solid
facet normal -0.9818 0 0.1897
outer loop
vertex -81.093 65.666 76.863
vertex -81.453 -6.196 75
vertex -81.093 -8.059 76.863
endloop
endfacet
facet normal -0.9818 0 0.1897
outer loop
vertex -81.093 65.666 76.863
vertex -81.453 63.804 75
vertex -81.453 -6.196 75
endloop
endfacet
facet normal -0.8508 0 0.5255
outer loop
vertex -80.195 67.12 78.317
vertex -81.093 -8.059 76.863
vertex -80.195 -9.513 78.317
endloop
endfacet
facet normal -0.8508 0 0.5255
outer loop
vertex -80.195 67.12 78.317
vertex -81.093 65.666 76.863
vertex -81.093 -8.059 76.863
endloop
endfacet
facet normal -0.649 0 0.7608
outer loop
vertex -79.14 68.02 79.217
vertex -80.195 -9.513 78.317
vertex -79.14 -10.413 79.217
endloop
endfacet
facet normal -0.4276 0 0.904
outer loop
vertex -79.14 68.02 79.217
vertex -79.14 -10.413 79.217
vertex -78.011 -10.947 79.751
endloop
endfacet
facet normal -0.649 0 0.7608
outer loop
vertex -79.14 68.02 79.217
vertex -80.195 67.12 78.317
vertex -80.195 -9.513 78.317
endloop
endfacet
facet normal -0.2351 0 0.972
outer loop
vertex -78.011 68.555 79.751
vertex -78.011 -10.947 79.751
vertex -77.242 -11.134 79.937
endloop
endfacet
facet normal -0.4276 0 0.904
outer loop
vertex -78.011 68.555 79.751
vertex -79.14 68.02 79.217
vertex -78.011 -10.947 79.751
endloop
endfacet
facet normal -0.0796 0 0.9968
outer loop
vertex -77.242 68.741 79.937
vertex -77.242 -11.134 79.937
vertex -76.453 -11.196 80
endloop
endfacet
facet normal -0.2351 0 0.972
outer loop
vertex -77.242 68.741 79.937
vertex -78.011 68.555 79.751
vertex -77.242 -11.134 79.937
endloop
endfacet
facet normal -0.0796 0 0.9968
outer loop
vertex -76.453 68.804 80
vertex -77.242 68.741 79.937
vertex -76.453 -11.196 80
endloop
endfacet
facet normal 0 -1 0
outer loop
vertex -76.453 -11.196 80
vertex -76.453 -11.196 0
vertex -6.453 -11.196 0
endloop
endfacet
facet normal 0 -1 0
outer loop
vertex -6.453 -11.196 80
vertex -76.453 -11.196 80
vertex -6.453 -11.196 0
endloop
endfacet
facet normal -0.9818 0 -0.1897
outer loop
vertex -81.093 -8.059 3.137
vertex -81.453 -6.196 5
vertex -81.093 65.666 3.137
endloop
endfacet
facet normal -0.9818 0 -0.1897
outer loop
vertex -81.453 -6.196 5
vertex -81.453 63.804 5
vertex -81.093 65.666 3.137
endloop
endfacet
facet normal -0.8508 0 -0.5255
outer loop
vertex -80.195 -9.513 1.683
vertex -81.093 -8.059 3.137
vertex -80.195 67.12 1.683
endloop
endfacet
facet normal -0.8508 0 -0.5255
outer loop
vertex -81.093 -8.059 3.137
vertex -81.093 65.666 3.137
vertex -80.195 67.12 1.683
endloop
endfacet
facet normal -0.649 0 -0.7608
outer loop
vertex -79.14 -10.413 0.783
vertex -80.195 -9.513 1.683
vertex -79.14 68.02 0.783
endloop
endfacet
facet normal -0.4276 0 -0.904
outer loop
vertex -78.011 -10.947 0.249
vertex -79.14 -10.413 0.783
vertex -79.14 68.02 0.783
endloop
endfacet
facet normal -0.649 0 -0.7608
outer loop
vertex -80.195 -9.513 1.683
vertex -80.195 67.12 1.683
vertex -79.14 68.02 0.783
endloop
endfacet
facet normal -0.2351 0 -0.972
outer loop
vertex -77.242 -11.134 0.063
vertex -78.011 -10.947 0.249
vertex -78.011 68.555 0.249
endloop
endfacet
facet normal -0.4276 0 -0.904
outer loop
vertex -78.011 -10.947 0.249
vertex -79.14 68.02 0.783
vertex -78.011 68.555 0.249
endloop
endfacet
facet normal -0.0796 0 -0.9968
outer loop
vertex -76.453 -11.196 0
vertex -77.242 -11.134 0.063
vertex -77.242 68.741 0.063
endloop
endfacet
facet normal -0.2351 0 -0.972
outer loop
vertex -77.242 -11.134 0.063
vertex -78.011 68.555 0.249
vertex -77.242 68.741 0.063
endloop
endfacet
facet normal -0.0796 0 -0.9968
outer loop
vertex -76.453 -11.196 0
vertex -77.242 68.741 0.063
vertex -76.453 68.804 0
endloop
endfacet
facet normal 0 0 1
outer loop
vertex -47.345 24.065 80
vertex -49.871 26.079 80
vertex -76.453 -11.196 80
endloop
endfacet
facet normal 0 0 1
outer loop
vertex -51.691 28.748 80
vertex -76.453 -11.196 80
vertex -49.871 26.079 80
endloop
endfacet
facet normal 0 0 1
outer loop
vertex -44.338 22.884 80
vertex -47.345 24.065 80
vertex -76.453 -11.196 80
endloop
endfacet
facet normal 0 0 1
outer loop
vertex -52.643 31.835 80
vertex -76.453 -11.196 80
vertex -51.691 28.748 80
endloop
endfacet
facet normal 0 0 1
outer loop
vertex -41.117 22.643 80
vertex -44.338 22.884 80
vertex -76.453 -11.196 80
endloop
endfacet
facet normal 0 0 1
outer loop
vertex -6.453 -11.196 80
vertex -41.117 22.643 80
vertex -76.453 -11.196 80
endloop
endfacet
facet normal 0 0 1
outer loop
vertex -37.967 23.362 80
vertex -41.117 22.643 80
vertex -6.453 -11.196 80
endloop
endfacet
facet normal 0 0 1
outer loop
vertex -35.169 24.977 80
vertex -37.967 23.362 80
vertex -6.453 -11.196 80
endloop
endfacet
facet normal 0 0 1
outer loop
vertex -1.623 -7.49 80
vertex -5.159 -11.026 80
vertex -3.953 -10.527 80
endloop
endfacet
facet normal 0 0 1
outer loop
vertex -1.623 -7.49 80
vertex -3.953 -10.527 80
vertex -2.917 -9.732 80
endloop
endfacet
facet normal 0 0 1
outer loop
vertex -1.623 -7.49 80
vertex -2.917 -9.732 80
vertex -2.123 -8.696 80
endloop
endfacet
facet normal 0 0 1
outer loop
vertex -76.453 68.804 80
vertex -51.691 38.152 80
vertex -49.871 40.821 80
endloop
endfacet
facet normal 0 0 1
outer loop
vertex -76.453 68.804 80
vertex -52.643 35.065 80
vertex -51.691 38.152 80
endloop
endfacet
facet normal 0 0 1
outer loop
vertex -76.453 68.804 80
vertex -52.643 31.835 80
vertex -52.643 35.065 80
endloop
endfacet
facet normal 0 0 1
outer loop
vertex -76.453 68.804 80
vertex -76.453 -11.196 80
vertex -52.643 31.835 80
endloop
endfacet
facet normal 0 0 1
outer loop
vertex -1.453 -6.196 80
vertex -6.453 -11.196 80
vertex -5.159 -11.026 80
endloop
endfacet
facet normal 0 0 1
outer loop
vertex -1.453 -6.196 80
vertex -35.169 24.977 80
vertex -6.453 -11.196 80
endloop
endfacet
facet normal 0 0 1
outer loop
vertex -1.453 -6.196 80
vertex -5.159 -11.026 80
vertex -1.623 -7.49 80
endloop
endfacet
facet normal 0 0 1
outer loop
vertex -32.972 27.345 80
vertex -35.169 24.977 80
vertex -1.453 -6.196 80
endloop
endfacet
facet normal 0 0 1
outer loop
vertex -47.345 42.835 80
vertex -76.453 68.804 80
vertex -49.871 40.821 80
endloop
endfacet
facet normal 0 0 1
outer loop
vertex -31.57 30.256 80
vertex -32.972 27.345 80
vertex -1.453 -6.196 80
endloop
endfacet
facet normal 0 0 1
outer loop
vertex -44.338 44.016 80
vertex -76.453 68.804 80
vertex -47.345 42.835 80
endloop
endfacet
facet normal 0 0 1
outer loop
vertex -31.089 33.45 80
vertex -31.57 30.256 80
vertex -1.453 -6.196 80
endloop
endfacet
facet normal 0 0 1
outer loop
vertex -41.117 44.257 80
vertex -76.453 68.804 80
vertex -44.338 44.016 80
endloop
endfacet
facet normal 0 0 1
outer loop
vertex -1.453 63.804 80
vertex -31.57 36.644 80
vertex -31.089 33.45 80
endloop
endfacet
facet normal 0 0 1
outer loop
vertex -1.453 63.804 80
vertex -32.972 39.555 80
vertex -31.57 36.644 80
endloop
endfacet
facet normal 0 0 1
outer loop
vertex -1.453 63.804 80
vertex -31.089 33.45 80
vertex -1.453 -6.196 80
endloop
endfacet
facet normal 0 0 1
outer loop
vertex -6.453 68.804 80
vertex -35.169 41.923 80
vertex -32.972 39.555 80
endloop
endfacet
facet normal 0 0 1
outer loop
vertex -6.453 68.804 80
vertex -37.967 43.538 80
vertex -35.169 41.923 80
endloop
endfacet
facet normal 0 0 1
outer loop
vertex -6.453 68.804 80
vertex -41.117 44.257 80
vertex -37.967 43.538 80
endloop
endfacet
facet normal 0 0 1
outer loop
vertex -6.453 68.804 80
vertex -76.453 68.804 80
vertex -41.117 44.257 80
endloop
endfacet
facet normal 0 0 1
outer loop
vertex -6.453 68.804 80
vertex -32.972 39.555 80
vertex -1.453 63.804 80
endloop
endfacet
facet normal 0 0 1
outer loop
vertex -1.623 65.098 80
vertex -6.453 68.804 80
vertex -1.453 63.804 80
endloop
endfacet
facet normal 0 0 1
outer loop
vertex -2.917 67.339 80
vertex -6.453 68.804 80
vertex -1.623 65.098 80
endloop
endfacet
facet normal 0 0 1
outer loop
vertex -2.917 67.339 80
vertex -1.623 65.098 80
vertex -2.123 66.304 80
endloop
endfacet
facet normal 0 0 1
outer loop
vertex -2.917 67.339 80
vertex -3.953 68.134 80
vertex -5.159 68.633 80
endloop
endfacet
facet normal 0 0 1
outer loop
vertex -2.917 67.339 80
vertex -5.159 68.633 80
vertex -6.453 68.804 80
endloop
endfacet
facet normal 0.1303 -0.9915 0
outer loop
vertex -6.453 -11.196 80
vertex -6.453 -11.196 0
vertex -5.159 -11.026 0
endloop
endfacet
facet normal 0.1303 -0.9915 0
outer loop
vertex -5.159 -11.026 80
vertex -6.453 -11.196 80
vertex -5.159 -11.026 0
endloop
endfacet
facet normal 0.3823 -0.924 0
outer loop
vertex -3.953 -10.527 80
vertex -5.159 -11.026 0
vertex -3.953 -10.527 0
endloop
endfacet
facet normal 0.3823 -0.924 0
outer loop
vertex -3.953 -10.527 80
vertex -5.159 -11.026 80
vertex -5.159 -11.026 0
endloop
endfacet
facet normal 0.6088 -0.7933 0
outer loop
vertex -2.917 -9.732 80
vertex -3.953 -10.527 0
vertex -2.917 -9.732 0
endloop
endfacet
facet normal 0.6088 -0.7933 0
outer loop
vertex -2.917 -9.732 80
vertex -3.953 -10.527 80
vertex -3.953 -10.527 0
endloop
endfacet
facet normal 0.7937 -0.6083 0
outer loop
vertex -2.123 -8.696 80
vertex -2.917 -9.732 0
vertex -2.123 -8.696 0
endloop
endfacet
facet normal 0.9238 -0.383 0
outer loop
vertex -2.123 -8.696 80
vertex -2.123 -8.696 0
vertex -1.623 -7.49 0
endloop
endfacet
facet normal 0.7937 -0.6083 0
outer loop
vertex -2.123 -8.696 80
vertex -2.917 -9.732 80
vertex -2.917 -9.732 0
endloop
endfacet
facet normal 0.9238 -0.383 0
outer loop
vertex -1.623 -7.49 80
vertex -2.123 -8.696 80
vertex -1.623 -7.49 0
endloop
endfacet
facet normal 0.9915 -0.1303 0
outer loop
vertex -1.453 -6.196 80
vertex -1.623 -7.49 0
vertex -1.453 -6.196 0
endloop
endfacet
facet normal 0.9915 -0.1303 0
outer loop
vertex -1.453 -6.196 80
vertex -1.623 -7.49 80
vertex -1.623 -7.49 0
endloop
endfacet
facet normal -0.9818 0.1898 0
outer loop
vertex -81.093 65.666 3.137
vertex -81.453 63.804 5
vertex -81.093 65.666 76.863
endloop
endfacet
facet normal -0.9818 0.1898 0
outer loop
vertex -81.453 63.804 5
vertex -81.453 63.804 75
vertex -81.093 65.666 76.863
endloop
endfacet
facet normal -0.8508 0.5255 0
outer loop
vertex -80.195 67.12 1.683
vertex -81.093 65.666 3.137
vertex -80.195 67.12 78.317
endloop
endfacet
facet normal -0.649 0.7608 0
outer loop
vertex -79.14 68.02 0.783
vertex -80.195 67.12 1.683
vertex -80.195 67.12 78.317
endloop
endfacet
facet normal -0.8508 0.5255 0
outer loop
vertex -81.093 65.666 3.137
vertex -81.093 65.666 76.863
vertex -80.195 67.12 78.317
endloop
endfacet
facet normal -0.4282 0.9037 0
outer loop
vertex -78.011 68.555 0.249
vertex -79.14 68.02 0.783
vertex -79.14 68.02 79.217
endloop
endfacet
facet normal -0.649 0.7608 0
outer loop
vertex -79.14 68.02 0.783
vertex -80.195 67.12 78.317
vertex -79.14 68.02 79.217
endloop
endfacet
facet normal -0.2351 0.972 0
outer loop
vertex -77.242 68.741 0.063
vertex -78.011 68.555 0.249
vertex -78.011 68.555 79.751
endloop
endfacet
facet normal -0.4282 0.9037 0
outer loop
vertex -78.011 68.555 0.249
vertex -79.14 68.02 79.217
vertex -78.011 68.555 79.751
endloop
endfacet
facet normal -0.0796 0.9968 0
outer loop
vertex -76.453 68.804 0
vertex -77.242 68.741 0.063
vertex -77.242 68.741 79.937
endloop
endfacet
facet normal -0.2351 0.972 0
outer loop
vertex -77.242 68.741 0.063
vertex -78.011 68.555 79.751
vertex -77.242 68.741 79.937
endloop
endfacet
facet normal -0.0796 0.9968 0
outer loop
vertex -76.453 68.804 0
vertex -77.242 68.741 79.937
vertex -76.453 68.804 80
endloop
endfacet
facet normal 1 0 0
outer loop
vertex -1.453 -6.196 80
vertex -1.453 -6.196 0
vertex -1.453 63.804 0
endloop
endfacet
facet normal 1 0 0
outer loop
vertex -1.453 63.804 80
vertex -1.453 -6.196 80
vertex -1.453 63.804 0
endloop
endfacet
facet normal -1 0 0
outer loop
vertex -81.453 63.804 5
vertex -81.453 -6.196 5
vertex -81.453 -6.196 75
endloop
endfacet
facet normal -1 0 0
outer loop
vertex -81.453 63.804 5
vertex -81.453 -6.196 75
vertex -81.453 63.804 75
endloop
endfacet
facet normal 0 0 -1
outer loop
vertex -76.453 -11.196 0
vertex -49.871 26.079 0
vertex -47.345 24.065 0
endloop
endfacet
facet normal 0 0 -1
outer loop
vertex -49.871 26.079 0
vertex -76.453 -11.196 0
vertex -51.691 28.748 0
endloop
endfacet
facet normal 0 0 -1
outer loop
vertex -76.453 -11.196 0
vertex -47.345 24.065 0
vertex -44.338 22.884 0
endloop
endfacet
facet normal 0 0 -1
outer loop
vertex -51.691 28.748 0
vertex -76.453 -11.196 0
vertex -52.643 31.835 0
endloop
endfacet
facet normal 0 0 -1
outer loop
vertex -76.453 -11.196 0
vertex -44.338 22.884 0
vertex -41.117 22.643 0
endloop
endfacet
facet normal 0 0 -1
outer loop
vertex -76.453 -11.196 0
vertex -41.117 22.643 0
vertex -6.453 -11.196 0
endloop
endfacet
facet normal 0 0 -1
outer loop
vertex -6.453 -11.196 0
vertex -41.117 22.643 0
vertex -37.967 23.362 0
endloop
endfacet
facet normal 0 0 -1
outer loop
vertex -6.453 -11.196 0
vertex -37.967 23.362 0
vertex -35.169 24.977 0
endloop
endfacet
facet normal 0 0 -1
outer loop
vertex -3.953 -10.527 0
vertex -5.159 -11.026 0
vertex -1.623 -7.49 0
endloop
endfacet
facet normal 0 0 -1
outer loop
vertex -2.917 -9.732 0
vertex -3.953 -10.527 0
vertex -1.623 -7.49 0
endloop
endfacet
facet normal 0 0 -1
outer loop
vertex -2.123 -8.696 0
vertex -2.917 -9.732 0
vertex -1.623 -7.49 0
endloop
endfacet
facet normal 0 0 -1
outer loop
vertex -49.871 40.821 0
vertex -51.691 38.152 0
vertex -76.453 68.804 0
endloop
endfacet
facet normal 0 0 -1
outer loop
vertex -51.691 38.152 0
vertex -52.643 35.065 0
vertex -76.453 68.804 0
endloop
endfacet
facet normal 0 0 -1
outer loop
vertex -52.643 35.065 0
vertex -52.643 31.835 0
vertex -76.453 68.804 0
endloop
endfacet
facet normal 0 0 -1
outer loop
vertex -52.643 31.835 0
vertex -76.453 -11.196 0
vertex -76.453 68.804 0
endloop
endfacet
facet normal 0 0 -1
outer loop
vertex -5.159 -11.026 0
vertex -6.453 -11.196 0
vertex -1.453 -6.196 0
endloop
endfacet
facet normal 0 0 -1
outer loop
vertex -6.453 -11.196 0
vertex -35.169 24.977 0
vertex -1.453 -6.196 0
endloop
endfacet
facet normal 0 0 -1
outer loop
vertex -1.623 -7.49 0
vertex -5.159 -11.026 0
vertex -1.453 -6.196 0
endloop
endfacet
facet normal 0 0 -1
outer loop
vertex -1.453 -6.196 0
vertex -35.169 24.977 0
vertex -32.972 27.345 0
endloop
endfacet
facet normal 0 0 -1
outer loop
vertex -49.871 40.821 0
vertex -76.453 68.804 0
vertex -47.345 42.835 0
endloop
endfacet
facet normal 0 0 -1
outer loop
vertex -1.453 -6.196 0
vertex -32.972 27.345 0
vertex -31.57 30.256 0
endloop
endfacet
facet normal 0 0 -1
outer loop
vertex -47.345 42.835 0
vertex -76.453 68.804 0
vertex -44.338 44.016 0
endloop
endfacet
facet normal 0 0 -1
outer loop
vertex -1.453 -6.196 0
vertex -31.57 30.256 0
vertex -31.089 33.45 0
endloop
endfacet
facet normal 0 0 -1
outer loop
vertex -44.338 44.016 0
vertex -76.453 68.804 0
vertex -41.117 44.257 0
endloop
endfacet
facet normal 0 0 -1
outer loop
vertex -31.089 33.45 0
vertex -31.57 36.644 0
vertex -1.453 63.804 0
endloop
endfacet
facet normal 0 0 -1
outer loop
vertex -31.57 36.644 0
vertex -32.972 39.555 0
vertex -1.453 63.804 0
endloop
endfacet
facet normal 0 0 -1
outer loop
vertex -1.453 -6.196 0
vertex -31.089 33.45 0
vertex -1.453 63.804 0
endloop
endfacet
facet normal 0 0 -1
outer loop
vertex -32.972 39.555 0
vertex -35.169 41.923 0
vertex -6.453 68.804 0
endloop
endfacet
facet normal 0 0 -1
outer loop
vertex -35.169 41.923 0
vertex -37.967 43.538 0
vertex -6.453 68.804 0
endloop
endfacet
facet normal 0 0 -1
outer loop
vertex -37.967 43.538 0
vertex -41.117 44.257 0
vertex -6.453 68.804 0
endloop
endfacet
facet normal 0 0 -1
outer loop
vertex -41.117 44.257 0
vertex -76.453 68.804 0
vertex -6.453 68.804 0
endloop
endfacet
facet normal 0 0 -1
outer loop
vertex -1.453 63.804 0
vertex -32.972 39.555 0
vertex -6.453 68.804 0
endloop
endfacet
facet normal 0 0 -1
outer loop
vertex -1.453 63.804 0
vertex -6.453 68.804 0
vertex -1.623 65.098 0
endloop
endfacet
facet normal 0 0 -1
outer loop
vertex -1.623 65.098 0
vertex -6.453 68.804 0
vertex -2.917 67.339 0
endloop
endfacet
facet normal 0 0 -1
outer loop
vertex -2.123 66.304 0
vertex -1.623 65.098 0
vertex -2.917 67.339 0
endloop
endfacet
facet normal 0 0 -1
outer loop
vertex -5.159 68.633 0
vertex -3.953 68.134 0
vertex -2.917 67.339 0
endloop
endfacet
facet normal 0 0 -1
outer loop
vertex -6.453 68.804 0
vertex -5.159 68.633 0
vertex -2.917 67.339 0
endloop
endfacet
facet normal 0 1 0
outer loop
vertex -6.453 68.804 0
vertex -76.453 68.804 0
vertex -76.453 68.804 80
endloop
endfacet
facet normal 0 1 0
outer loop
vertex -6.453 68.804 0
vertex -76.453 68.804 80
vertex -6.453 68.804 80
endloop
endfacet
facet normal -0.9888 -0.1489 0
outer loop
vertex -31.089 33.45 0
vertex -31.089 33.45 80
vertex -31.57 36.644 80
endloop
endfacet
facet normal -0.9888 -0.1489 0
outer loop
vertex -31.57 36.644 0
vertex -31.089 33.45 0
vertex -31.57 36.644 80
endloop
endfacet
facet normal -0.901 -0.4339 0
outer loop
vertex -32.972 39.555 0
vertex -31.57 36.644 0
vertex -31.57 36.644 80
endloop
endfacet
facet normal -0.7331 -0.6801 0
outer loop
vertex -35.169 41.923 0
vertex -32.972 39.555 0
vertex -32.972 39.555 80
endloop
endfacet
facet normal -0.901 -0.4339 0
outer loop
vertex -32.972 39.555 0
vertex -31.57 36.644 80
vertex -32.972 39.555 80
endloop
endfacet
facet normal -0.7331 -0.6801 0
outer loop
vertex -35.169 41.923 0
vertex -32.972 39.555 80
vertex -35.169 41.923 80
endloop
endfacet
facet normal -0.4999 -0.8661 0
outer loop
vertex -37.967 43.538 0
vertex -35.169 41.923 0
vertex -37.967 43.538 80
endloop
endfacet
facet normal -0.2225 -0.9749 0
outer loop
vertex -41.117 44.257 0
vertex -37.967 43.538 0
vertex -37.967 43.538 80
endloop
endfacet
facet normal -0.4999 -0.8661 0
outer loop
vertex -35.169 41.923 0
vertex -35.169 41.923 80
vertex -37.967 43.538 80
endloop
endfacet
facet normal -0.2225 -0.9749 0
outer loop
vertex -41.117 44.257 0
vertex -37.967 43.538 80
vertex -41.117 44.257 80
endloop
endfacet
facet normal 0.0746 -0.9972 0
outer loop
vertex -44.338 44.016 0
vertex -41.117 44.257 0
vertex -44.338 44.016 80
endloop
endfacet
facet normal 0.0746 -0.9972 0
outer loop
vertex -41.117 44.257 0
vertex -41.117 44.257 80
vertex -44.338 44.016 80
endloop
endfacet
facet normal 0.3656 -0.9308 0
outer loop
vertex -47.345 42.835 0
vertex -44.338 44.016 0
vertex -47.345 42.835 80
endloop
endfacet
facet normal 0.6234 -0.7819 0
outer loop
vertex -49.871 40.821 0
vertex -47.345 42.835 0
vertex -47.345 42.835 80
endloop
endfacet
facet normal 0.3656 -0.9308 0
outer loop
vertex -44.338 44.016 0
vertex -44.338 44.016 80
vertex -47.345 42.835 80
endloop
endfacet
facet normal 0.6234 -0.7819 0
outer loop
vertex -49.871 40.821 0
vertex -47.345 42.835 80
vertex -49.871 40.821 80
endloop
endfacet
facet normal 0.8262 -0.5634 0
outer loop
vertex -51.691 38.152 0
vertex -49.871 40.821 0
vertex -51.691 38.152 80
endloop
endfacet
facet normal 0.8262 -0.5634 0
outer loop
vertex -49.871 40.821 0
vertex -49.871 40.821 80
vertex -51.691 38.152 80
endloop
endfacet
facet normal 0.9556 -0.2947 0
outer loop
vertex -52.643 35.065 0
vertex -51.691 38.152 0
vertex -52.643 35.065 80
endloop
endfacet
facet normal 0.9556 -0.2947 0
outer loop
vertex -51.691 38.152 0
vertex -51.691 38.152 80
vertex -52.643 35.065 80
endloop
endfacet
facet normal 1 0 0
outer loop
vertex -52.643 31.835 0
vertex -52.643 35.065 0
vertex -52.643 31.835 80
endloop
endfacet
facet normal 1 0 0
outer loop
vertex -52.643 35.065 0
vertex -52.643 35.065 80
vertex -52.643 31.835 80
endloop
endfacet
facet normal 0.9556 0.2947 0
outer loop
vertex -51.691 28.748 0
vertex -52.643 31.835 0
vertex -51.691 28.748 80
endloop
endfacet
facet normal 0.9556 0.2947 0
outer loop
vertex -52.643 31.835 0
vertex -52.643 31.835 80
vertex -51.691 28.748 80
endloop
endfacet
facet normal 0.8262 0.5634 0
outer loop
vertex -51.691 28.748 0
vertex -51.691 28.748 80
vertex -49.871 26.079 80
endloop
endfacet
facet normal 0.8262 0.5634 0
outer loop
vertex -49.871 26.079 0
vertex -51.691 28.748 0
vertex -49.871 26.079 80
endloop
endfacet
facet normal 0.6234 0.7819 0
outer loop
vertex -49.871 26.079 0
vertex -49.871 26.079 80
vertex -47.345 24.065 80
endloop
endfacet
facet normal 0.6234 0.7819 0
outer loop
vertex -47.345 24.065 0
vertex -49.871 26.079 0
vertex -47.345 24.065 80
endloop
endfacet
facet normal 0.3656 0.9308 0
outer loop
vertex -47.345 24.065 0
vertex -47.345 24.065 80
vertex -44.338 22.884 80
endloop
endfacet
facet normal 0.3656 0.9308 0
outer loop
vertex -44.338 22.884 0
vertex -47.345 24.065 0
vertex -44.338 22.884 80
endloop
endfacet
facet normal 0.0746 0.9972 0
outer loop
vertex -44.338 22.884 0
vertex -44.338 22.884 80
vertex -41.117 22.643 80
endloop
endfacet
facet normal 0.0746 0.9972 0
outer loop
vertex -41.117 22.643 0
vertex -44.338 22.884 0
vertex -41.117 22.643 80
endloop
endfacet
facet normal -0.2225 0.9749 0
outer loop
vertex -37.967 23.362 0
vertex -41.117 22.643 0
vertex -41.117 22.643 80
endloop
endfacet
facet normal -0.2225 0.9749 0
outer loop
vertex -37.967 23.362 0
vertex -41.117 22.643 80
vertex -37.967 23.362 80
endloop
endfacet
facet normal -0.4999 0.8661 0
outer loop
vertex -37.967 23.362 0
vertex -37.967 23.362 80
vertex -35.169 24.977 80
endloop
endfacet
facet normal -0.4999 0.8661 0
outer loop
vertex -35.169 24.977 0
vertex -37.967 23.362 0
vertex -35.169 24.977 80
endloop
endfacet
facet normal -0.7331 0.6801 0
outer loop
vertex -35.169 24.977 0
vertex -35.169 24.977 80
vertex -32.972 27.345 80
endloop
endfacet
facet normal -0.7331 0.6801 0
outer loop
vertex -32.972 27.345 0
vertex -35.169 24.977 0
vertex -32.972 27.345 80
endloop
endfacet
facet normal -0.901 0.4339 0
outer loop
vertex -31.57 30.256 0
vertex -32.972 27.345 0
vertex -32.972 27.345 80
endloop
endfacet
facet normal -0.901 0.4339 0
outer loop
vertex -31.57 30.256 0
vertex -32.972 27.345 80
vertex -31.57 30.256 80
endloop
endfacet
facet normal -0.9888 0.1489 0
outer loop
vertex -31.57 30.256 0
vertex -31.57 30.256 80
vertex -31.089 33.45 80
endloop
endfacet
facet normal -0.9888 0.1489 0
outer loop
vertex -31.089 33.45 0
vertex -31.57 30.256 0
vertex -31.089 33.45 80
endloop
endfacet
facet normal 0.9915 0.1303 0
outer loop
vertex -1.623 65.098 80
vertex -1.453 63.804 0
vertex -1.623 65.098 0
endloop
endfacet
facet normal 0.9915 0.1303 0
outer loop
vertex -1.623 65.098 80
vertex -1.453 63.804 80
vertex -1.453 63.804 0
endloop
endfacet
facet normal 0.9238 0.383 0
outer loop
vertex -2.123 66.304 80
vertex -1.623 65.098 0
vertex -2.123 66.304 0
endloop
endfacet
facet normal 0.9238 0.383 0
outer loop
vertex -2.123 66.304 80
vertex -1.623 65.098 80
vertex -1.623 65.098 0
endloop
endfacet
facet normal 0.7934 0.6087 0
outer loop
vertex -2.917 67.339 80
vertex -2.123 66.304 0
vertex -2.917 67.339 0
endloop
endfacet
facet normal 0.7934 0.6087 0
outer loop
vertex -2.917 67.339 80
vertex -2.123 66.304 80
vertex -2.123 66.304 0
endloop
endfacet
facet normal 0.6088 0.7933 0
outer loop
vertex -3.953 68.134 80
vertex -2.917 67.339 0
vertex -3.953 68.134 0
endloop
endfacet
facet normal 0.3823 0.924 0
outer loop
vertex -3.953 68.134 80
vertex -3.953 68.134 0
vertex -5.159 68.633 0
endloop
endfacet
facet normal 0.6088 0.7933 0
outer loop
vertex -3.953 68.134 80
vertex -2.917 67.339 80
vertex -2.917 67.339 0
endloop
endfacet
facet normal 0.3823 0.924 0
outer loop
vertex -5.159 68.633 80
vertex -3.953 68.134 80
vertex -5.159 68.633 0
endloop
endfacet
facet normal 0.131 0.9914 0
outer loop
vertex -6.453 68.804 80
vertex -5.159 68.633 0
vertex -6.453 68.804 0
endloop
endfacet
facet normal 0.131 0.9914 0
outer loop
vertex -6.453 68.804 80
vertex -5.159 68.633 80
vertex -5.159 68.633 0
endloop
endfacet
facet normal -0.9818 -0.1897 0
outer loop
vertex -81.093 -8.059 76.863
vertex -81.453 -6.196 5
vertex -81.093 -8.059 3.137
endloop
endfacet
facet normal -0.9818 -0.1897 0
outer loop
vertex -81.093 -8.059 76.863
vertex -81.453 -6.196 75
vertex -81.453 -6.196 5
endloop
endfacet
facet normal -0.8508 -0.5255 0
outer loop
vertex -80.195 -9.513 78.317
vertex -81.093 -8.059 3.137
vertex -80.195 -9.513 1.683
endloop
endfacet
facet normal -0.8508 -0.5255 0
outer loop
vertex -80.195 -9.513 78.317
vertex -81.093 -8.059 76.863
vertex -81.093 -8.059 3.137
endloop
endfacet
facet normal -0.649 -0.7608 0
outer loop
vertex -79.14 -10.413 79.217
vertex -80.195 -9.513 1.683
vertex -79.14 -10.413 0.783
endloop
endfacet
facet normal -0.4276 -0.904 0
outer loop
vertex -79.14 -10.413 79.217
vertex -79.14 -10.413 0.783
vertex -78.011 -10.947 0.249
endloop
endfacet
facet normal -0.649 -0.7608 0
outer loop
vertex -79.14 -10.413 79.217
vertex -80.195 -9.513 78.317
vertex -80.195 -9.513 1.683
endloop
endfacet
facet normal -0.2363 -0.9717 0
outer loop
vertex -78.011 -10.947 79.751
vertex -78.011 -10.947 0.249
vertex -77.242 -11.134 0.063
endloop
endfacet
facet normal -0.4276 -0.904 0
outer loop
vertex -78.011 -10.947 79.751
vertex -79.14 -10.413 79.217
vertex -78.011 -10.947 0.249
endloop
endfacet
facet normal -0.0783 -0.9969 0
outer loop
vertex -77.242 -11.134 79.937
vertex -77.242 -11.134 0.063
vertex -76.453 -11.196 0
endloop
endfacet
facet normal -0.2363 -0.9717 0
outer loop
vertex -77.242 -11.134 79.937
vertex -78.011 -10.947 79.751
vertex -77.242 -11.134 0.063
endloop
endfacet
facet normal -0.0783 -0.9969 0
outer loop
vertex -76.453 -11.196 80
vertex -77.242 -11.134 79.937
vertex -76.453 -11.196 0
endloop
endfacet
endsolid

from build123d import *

# Parameters (mm, degrees)
F0_W     = 80
F0_H     = 80
F1_DEPTH = 80
F3_R     = 5
F2_R     = 10.8374332622
F4_DEPTH = 80.001


with BuildPart() as f1:
    # F0 (on Top) → F1 (new body)
    with BuildSketch(Plane.XY):
        with Locations((-41.452800855, 28.8035999984)):
            Rectangle(F0_W, F0_H)
    extrude(amount=F1_DEPTH)

    # F3
    f3_edges = [f1.edges().sort_by_distance(p)[0] for p in [
        (-81.452801, -11.1964, 40),
        (-1.452801, -11.1964, 40),
        (-1.452801, 68.8036, 40),
        (-81.452801, 68.8036, 40),
        (-81.452801, 28.8036, 0),
        (-81.452801, 28.8036, 80),
    ]]
    fillet(f3_edges, radius=F3_R)

    # F2 (on face) → F4 (cut, through all)
    with BuildSketch(Plane.XY.offset(80)):
        with Locations((-41.9264025986, 33.4499999881)):
            Circle(F2_R)
    extrude(amount=-F4_DEPTH, mode=Mode.SUBTRACT)


solid = f1.part
